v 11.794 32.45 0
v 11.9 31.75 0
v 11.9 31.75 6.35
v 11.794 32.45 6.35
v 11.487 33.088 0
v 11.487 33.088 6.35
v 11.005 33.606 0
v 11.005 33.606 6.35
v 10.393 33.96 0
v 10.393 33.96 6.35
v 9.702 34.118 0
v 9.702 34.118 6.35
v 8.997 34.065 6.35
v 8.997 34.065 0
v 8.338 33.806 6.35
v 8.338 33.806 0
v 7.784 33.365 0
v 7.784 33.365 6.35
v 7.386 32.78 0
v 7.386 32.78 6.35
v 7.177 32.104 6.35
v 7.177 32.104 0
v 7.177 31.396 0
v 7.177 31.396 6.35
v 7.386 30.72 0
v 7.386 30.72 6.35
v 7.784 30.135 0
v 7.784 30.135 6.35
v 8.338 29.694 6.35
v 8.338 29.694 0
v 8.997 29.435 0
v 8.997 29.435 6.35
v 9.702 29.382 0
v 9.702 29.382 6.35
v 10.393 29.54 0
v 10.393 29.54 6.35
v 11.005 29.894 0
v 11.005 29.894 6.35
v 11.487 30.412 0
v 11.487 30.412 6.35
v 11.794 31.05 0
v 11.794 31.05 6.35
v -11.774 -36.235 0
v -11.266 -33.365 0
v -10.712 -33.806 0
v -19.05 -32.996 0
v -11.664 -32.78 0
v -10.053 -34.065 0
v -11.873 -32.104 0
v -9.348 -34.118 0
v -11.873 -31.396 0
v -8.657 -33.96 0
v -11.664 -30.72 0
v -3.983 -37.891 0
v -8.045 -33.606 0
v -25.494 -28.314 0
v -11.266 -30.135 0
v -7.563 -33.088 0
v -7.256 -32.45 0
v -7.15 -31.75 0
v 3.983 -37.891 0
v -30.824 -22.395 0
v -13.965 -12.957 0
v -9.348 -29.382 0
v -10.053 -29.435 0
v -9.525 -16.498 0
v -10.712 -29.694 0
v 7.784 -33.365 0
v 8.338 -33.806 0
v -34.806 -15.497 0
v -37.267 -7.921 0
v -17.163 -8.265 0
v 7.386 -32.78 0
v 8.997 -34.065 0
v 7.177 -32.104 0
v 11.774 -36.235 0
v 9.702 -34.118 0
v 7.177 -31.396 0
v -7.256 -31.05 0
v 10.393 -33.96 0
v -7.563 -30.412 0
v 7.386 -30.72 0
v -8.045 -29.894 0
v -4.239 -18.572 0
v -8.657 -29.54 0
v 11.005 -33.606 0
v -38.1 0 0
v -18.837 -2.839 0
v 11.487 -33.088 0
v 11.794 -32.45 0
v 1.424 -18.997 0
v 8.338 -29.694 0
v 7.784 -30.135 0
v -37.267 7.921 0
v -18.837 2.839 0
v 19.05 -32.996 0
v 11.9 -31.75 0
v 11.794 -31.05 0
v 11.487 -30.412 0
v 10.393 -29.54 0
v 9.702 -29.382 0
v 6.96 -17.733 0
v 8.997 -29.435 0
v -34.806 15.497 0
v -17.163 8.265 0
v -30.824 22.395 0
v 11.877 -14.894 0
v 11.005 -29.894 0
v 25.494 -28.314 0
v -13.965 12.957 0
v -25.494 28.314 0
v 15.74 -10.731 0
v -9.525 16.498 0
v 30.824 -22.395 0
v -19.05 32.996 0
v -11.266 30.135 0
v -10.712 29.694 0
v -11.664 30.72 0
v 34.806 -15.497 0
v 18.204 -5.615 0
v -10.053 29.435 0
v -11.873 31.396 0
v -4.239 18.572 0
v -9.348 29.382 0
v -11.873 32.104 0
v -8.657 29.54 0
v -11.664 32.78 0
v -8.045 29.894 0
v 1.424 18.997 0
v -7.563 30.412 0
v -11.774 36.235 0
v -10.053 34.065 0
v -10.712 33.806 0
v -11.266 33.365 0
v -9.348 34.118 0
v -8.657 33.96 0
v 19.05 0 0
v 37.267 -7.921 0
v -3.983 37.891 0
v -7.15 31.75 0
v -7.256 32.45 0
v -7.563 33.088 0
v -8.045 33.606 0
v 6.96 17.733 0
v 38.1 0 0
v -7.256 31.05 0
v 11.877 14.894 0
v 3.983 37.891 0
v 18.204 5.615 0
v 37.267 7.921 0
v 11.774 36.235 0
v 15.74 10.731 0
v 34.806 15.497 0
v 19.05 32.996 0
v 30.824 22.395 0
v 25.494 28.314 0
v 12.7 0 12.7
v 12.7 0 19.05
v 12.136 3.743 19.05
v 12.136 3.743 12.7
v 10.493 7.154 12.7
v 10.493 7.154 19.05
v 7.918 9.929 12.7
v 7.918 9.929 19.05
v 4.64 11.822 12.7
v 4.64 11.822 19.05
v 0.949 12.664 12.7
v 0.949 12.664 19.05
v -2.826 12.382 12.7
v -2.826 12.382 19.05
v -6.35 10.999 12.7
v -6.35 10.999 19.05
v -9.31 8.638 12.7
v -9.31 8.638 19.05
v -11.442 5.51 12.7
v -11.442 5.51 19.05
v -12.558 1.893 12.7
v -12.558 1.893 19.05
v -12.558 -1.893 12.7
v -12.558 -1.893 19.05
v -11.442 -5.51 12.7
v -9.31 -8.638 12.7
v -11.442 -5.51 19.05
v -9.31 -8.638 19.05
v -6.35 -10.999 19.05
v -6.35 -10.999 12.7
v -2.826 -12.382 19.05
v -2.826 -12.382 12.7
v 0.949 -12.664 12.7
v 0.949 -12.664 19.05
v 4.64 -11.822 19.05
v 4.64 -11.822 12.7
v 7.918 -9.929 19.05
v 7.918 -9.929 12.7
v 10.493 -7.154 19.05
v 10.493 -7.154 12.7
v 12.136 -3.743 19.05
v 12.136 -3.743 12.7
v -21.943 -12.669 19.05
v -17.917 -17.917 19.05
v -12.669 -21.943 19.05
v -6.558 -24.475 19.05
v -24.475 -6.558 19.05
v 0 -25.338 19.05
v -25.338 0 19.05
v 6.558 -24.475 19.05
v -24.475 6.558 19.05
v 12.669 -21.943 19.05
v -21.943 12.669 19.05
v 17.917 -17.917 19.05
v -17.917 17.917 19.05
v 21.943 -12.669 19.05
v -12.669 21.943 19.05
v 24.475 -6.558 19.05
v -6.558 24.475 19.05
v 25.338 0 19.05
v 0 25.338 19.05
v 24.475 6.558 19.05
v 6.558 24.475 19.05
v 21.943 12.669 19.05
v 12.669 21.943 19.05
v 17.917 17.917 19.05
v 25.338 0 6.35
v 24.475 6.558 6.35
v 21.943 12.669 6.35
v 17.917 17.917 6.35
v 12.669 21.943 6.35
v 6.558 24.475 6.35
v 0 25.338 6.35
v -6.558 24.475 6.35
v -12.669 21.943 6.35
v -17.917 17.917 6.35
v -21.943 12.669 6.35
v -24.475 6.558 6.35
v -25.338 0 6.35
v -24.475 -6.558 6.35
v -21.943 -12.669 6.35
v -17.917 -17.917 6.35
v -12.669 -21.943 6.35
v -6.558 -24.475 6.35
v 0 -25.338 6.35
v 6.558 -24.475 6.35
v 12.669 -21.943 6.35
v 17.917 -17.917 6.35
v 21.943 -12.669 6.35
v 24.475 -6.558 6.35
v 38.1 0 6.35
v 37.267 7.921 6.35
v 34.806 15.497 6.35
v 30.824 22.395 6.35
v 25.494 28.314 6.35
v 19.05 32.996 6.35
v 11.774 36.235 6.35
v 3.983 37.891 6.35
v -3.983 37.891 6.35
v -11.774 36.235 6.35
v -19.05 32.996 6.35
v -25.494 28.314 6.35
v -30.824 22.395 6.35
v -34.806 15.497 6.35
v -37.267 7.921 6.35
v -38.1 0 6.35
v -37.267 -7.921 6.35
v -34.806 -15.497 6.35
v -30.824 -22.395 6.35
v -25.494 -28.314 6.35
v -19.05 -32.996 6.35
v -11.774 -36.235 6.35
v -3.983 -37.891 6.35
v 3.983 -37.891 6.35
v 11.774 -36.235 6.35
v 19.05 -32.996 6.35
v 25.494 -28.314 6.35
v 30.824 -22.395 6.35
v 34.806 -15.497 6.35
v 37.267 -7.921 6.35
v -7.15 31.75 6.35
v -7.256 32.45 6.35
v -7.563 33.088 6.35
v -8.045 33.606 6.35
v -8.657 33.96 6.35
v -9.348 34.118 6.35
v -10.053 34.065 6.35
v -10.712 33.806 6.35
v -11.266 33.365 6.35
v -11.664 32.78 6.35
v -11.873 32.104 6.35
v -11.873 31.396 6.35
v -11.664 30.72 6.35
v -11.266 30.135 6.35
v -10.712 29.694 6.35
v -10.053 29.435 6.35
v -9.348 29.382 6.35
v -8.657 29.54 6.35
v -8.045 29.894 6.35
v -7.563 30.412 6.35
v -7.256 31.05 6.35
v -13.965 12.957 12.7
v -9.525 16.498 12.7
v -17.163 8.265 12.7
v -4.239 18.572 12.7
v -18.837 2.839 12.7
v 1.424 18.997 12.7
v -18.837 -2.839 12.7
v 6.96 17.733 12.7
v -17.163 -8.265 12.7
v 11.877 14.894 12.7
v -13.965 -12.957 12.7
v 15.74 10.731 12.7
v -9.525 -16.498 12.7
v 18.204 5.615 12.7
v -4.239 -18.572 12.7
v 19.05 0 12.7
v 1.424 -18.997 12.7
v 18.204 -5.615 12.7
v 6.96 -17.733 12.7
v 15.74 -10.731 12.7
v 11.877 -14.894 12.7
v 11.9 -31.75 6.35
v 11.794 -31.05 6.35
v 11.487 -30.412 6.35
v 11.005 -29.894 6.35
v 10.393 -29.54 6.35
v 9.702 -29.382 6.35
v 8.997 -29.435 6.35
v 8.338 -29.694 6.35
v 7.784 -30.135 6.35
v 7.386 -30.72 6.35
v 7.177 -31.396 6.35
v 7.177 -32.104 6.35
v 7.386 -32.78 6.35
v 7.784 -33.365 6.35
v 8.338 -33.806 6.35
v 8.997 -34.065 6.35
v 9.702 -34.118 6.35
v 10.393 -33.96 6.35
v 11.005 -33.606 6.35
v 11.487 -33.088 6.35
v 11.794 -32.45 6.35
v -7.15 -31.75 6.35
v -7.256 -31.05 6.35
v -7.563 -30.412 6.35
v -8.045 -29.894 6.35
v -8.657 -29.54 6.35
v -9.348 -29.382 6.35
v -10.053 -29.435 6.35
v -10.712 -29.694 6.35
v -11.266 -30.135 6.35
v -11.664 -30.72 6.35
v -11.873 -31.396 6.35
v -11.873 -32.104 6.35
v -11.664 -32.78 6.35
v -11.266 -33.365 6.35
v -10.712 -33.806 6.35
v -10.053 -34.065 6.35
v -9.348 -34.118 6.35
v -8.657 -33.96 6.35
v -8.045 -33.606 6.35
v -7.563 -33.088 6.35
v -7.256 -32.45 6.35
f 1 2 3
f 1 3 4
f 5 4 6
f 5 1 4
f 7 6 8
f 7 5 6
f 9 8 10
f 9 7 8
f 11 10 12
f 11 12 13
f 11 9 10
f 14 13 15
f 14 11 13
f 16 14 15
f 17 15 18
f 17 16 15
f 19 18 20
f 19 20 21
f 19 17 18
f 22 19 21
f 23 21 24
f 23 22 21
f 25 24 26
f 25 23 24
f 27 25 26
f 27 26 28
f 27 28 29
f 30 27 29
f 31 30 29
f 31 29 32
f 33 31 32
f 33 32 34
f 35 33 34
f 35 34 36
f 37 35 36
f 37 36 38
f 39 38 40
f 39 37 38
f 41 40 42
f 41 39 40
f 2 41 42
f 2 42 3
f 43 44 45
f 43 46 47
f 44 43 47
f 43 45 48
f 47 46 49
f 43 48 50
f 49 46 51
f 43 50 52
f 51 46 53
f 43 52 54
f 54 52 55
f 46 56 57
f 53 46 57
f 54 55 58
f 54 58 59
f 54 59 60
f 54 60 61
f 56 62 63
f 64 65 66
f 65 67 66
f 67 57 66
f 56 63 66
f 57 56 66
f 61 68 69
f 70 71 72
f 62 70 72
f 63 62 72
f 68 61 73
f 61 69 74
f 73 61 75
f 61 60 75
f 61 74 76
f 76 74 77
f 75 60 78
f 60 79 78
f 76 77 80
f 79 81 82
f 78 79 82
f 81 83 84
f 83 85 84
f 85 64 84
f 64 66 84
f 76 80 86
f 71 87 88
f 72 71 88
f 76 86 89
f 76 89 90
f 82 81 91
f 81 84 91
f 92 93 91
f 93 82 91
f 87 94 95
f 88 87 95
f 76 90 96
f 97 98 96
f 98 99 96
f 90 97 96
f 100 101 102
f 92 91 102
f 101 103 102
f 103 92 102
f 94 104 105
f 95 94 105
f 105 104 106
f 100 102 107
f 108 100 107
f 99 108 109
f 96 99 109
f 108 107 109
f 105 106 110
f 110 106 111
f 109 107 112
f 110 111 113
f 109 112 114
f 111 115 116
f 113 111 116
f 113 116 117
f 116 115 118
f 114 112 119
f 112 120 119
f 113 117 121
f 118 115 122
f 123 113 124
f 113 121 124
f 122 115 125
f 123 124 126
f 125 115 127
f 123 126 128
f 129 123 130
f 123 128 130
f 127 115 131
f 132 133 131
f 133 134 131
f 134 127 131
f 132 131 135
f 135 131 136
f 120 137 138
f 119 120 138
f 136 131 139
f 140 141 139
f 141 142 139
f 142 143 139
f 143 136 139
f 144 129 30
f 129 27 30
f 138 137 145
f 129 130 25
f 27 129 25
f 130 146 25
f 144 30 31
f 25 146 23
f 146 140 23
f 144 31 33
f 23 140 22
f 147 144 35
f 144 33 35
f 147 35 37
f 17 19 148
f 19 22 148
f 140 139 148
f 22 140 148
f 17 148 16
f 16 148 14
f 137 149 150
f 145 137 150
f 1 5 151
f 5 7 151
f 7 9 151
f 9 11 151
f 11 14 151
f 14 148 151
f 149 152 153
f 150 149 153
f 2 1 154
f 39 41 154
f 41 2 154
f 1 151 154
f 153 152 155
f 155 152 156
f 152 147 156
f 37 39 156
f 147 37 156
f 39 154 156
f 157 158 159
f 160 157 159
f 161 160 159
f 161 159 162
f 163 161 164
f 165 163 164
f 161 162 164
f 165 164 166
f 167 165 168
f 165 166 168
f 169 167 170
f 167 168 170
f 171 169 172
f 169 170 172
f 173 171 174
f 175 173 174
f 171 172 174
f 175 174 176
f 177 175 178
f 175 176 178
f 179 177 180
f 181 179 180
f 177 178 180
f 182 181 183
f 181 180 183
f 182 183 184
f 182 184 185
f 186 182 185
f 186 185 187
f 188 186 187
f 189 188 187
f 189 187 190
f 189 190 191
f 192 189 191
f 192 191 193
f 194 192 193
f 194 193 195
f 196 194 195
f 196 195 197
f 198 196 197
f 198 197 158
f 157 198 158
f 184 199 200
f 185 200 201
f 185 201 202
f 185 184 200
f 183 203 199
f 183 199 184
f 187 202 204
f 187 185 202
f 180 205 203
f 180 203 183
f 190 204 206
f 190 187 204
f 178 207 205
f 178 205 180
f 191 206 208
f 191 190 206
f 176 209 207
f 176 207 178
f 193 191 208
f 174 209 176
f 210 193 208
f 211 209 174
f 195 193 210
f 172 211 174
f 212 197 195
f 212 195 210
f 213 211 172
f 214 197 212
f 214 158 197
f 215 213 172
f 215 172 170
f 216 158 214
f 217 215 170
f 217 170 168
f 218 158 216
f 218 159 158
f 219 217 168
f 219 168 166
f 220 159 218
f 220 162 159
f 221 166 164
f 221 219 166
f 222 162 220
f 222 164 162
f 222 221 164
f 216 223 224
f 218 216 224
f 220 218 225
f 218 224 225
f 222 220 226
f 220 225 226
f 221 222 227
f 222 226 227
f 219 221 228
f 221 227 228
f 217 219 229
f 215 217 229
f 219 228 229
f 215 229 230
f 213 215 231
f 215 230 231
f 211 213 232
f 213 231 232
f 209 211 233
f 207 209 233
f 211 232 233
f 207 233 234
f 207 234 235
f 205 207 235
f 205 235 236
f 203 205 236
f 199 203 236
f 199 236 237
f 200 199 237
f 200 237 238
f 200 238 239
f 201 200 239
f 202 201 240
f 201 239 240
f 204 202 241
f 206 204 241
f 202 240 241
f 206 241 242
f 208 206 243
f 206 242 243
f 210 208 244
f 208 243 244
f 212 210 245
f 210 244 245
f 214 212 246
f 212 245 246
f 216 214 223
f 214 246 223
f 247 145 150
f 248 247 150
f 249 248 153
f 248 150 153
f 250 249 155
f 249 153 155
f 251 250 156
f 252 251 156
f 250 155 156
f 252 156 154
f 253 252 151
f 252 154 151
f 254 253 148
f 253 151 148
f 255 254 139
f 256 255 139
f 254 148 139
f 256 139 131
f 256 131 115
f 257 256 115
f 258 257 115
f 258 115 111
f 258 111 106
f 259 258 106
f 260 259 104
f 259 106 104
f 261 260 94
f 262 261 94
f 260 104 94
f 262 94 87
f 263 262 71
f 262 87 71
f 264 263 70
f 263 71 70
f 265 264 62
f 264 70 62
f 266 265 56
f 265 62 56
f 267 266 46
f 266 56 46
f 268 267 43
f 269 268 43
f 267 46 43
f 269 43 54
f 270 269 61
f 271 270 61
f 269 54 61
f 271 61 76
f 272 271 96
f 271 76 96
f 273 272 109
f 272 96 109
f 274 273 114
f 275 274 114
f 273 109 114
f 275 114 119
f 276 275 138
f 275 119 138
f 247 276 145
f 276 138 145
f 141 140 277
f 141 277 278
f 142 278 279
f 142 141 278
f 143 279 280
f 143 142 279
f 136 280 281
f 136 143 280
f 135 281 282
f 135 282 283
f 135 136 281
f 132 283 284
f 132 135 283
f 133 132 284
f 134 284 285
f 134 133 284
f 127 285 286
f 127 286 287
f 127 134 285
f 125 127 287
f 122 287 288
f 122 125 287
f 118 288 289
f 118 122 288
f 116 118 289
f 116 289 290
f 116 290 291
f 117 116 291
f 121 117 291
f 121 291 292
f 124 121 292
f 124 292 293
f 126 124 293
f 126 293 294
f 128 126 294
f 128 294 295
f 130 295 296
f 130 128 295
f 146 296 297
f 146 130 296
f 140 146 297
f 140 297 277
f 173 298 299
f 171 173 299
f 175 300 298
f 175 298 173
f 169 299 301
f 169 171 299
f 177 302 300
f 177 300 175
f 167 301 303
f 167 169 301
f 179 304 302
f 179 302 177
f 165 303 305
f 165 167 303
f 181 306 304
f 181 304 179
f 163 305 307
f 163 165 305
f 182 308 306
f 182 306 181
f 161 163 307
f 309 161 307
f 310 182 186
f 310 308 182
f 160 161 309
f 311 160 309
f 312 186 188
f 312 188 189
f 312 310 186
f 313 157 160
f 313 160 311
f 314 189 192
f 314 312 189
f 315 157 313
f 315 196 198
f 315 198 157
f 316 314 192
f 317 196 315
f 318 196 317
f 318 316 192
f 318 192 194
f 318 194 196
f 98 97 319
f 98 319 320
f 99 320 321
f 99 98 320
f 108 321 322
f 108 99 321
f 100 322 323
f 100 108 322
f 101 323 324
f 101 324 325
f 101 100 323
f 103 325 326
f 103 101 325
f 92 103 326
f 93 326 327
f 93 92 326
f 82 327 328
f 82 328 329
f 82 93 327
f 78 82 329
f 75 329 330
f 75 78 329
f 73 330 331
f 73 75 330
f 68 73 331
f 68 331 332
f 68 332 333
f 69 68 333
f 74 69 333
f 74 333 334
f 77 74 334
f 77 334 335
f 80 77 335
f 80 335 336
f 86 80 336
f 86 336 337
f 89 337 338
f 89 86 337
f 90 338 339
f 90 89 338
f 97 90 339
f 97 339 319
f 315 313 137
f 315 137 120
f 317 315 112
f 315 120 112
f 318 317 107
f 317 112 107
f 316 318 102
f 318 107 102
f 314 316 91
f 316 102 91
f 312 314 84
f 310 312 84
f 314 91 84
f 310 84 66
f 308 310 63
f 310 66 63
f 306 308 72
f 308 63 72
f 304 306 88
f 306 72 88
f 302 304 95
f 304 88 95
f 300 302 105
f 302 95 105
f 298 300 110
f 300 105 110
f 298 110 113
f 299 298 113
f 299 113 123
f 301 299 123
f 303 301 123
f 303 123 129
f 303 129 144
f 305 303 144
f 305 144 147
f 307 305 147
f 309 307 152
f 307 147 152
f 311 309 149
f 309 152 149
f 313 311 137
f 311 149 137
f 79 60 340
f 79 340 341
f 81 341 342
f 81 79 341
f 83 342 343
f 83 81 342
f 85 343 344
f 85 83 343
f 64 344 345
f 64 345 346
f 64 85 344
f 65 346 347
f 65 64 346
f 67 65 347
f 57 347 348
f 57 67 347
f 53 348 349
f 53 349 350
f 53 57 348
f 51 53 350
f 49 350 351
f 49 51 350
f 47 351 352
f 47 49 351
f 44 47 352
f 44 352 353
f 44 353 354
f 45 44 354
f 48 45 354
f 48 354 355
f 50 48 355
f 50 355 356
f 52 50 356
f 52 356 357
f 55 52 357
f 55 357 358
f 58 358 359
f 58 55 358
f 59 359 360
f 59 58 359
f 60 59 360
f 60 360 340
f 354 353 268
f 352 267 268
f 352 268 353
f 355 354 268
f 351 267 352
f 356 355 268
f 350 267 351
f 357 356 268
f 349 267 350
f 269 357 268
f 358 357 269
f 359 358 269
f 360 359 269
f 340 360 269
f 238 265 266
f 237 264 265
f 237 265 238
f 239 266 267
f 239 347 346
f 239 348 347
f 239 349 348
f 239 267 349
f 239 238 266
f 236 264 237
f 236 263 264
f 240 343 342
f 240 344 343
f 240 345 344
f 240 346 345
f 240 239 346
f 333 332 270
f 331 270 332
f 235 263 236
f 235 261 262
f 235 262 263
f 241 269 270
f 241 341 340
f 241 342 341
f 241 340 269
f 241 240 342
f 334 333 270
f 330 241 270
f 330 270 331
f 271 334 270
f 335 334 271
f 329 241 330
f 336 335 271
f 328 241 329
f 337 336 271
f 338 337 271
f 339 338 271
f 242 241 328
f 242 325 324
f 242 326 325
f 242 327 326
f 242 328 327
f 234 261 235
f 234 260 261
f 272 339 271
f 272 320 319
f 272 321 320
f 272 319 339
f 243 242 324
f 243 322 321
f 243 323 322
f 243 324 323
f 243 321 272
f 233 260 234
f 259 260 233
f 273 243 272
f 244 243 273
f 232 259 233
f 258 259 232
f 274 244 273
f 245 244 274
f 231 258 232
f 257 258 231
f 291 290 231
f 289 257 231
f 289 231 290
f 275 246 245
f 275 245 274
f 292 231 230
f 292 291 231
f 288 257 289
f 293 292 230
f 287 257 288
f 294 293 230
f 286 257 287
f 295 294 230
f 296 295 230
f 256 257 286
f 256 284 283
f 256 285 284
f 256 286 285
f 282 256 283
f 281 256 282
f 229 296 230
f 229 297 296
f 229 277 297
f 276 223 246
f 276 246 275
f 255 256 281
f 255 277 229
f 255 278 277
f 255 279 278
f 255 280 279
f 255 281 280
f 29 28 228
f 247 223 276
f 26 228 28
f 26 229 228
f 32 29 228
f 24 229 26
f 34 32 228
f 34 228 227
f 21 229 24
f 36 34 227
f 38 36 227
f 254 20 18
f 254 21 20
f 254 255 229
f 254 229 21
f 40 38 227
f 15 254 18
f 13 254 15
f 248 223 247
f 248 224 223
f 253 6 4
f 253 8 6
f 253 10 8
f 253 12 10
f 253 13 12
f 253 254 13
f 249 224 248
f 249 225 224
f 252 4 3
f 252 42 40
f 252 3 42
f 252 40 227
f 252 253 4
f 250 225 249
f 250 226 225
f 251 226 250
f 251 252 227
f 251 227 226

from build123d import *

# Parameters (mm, degrees)
F0_R     = 38.1
F0_R_2   = 2.37453
F0_R_3   = 25.404017
F1_DEPTH = 6.35
F2_R     = 25.338119
F3_DEPTH = 12.7
F4_R     = 19.05
F5_DEPTH = 12.7
F6_R     = 12.7
F7_DEPTH = 25.4


with BuildPart() as f1:
    # F0 (on Top) → F1 (new body)
    with BuildSketch(Plane.XY):
        Circle(F0_R)
        with Locations((-9.525, -31.75)):
            Circle(F0_R_2, mode=Mode.SUBTRACT)
        with Locations((9.525, -31.75)):
            Circle(F0_R_2, mode=Mode.SUBTRACT)
        with Locations((-9.525, 31.75)):
            Circle(F0_R_2, mode=Mode.SUBTRACT)
        Circle(F0_R_3, mode=Mode.SUBTRACT)
        with Locations((9.525, 31.75)):
            Circle(F0_R_2, mode=Mode.SUBTRACT)
        Circle(F0_R_3)
    extrude(amount=F1_DEPTH)

    # F2 (on face) → F3 (join)
    with BuildSketch(Plane.XY.offset(6.35)):
        Circle(F2_R)
    extrude(amount=F3_DEPTH)

    # F4 (on face) → F5 (cut)
    with BuildSketch(Plane(origin=(0, 0, 0), x_dir=(1, 0, 0), z_dir=(0, 0, -1))):
        Circle(F4_R)
    extrude(amount=-F5_DEPTH, mode=Mode.SUBTRACT)

    # F6 (on face) → F7 (cut)
    with BuildSketch(Plane.XY.offset(19.05)):
        Circle(F6_R)
    extrude(amount=-F7_DEPTH, mode=Mode.SUBTRACT)


solid = f1.part
